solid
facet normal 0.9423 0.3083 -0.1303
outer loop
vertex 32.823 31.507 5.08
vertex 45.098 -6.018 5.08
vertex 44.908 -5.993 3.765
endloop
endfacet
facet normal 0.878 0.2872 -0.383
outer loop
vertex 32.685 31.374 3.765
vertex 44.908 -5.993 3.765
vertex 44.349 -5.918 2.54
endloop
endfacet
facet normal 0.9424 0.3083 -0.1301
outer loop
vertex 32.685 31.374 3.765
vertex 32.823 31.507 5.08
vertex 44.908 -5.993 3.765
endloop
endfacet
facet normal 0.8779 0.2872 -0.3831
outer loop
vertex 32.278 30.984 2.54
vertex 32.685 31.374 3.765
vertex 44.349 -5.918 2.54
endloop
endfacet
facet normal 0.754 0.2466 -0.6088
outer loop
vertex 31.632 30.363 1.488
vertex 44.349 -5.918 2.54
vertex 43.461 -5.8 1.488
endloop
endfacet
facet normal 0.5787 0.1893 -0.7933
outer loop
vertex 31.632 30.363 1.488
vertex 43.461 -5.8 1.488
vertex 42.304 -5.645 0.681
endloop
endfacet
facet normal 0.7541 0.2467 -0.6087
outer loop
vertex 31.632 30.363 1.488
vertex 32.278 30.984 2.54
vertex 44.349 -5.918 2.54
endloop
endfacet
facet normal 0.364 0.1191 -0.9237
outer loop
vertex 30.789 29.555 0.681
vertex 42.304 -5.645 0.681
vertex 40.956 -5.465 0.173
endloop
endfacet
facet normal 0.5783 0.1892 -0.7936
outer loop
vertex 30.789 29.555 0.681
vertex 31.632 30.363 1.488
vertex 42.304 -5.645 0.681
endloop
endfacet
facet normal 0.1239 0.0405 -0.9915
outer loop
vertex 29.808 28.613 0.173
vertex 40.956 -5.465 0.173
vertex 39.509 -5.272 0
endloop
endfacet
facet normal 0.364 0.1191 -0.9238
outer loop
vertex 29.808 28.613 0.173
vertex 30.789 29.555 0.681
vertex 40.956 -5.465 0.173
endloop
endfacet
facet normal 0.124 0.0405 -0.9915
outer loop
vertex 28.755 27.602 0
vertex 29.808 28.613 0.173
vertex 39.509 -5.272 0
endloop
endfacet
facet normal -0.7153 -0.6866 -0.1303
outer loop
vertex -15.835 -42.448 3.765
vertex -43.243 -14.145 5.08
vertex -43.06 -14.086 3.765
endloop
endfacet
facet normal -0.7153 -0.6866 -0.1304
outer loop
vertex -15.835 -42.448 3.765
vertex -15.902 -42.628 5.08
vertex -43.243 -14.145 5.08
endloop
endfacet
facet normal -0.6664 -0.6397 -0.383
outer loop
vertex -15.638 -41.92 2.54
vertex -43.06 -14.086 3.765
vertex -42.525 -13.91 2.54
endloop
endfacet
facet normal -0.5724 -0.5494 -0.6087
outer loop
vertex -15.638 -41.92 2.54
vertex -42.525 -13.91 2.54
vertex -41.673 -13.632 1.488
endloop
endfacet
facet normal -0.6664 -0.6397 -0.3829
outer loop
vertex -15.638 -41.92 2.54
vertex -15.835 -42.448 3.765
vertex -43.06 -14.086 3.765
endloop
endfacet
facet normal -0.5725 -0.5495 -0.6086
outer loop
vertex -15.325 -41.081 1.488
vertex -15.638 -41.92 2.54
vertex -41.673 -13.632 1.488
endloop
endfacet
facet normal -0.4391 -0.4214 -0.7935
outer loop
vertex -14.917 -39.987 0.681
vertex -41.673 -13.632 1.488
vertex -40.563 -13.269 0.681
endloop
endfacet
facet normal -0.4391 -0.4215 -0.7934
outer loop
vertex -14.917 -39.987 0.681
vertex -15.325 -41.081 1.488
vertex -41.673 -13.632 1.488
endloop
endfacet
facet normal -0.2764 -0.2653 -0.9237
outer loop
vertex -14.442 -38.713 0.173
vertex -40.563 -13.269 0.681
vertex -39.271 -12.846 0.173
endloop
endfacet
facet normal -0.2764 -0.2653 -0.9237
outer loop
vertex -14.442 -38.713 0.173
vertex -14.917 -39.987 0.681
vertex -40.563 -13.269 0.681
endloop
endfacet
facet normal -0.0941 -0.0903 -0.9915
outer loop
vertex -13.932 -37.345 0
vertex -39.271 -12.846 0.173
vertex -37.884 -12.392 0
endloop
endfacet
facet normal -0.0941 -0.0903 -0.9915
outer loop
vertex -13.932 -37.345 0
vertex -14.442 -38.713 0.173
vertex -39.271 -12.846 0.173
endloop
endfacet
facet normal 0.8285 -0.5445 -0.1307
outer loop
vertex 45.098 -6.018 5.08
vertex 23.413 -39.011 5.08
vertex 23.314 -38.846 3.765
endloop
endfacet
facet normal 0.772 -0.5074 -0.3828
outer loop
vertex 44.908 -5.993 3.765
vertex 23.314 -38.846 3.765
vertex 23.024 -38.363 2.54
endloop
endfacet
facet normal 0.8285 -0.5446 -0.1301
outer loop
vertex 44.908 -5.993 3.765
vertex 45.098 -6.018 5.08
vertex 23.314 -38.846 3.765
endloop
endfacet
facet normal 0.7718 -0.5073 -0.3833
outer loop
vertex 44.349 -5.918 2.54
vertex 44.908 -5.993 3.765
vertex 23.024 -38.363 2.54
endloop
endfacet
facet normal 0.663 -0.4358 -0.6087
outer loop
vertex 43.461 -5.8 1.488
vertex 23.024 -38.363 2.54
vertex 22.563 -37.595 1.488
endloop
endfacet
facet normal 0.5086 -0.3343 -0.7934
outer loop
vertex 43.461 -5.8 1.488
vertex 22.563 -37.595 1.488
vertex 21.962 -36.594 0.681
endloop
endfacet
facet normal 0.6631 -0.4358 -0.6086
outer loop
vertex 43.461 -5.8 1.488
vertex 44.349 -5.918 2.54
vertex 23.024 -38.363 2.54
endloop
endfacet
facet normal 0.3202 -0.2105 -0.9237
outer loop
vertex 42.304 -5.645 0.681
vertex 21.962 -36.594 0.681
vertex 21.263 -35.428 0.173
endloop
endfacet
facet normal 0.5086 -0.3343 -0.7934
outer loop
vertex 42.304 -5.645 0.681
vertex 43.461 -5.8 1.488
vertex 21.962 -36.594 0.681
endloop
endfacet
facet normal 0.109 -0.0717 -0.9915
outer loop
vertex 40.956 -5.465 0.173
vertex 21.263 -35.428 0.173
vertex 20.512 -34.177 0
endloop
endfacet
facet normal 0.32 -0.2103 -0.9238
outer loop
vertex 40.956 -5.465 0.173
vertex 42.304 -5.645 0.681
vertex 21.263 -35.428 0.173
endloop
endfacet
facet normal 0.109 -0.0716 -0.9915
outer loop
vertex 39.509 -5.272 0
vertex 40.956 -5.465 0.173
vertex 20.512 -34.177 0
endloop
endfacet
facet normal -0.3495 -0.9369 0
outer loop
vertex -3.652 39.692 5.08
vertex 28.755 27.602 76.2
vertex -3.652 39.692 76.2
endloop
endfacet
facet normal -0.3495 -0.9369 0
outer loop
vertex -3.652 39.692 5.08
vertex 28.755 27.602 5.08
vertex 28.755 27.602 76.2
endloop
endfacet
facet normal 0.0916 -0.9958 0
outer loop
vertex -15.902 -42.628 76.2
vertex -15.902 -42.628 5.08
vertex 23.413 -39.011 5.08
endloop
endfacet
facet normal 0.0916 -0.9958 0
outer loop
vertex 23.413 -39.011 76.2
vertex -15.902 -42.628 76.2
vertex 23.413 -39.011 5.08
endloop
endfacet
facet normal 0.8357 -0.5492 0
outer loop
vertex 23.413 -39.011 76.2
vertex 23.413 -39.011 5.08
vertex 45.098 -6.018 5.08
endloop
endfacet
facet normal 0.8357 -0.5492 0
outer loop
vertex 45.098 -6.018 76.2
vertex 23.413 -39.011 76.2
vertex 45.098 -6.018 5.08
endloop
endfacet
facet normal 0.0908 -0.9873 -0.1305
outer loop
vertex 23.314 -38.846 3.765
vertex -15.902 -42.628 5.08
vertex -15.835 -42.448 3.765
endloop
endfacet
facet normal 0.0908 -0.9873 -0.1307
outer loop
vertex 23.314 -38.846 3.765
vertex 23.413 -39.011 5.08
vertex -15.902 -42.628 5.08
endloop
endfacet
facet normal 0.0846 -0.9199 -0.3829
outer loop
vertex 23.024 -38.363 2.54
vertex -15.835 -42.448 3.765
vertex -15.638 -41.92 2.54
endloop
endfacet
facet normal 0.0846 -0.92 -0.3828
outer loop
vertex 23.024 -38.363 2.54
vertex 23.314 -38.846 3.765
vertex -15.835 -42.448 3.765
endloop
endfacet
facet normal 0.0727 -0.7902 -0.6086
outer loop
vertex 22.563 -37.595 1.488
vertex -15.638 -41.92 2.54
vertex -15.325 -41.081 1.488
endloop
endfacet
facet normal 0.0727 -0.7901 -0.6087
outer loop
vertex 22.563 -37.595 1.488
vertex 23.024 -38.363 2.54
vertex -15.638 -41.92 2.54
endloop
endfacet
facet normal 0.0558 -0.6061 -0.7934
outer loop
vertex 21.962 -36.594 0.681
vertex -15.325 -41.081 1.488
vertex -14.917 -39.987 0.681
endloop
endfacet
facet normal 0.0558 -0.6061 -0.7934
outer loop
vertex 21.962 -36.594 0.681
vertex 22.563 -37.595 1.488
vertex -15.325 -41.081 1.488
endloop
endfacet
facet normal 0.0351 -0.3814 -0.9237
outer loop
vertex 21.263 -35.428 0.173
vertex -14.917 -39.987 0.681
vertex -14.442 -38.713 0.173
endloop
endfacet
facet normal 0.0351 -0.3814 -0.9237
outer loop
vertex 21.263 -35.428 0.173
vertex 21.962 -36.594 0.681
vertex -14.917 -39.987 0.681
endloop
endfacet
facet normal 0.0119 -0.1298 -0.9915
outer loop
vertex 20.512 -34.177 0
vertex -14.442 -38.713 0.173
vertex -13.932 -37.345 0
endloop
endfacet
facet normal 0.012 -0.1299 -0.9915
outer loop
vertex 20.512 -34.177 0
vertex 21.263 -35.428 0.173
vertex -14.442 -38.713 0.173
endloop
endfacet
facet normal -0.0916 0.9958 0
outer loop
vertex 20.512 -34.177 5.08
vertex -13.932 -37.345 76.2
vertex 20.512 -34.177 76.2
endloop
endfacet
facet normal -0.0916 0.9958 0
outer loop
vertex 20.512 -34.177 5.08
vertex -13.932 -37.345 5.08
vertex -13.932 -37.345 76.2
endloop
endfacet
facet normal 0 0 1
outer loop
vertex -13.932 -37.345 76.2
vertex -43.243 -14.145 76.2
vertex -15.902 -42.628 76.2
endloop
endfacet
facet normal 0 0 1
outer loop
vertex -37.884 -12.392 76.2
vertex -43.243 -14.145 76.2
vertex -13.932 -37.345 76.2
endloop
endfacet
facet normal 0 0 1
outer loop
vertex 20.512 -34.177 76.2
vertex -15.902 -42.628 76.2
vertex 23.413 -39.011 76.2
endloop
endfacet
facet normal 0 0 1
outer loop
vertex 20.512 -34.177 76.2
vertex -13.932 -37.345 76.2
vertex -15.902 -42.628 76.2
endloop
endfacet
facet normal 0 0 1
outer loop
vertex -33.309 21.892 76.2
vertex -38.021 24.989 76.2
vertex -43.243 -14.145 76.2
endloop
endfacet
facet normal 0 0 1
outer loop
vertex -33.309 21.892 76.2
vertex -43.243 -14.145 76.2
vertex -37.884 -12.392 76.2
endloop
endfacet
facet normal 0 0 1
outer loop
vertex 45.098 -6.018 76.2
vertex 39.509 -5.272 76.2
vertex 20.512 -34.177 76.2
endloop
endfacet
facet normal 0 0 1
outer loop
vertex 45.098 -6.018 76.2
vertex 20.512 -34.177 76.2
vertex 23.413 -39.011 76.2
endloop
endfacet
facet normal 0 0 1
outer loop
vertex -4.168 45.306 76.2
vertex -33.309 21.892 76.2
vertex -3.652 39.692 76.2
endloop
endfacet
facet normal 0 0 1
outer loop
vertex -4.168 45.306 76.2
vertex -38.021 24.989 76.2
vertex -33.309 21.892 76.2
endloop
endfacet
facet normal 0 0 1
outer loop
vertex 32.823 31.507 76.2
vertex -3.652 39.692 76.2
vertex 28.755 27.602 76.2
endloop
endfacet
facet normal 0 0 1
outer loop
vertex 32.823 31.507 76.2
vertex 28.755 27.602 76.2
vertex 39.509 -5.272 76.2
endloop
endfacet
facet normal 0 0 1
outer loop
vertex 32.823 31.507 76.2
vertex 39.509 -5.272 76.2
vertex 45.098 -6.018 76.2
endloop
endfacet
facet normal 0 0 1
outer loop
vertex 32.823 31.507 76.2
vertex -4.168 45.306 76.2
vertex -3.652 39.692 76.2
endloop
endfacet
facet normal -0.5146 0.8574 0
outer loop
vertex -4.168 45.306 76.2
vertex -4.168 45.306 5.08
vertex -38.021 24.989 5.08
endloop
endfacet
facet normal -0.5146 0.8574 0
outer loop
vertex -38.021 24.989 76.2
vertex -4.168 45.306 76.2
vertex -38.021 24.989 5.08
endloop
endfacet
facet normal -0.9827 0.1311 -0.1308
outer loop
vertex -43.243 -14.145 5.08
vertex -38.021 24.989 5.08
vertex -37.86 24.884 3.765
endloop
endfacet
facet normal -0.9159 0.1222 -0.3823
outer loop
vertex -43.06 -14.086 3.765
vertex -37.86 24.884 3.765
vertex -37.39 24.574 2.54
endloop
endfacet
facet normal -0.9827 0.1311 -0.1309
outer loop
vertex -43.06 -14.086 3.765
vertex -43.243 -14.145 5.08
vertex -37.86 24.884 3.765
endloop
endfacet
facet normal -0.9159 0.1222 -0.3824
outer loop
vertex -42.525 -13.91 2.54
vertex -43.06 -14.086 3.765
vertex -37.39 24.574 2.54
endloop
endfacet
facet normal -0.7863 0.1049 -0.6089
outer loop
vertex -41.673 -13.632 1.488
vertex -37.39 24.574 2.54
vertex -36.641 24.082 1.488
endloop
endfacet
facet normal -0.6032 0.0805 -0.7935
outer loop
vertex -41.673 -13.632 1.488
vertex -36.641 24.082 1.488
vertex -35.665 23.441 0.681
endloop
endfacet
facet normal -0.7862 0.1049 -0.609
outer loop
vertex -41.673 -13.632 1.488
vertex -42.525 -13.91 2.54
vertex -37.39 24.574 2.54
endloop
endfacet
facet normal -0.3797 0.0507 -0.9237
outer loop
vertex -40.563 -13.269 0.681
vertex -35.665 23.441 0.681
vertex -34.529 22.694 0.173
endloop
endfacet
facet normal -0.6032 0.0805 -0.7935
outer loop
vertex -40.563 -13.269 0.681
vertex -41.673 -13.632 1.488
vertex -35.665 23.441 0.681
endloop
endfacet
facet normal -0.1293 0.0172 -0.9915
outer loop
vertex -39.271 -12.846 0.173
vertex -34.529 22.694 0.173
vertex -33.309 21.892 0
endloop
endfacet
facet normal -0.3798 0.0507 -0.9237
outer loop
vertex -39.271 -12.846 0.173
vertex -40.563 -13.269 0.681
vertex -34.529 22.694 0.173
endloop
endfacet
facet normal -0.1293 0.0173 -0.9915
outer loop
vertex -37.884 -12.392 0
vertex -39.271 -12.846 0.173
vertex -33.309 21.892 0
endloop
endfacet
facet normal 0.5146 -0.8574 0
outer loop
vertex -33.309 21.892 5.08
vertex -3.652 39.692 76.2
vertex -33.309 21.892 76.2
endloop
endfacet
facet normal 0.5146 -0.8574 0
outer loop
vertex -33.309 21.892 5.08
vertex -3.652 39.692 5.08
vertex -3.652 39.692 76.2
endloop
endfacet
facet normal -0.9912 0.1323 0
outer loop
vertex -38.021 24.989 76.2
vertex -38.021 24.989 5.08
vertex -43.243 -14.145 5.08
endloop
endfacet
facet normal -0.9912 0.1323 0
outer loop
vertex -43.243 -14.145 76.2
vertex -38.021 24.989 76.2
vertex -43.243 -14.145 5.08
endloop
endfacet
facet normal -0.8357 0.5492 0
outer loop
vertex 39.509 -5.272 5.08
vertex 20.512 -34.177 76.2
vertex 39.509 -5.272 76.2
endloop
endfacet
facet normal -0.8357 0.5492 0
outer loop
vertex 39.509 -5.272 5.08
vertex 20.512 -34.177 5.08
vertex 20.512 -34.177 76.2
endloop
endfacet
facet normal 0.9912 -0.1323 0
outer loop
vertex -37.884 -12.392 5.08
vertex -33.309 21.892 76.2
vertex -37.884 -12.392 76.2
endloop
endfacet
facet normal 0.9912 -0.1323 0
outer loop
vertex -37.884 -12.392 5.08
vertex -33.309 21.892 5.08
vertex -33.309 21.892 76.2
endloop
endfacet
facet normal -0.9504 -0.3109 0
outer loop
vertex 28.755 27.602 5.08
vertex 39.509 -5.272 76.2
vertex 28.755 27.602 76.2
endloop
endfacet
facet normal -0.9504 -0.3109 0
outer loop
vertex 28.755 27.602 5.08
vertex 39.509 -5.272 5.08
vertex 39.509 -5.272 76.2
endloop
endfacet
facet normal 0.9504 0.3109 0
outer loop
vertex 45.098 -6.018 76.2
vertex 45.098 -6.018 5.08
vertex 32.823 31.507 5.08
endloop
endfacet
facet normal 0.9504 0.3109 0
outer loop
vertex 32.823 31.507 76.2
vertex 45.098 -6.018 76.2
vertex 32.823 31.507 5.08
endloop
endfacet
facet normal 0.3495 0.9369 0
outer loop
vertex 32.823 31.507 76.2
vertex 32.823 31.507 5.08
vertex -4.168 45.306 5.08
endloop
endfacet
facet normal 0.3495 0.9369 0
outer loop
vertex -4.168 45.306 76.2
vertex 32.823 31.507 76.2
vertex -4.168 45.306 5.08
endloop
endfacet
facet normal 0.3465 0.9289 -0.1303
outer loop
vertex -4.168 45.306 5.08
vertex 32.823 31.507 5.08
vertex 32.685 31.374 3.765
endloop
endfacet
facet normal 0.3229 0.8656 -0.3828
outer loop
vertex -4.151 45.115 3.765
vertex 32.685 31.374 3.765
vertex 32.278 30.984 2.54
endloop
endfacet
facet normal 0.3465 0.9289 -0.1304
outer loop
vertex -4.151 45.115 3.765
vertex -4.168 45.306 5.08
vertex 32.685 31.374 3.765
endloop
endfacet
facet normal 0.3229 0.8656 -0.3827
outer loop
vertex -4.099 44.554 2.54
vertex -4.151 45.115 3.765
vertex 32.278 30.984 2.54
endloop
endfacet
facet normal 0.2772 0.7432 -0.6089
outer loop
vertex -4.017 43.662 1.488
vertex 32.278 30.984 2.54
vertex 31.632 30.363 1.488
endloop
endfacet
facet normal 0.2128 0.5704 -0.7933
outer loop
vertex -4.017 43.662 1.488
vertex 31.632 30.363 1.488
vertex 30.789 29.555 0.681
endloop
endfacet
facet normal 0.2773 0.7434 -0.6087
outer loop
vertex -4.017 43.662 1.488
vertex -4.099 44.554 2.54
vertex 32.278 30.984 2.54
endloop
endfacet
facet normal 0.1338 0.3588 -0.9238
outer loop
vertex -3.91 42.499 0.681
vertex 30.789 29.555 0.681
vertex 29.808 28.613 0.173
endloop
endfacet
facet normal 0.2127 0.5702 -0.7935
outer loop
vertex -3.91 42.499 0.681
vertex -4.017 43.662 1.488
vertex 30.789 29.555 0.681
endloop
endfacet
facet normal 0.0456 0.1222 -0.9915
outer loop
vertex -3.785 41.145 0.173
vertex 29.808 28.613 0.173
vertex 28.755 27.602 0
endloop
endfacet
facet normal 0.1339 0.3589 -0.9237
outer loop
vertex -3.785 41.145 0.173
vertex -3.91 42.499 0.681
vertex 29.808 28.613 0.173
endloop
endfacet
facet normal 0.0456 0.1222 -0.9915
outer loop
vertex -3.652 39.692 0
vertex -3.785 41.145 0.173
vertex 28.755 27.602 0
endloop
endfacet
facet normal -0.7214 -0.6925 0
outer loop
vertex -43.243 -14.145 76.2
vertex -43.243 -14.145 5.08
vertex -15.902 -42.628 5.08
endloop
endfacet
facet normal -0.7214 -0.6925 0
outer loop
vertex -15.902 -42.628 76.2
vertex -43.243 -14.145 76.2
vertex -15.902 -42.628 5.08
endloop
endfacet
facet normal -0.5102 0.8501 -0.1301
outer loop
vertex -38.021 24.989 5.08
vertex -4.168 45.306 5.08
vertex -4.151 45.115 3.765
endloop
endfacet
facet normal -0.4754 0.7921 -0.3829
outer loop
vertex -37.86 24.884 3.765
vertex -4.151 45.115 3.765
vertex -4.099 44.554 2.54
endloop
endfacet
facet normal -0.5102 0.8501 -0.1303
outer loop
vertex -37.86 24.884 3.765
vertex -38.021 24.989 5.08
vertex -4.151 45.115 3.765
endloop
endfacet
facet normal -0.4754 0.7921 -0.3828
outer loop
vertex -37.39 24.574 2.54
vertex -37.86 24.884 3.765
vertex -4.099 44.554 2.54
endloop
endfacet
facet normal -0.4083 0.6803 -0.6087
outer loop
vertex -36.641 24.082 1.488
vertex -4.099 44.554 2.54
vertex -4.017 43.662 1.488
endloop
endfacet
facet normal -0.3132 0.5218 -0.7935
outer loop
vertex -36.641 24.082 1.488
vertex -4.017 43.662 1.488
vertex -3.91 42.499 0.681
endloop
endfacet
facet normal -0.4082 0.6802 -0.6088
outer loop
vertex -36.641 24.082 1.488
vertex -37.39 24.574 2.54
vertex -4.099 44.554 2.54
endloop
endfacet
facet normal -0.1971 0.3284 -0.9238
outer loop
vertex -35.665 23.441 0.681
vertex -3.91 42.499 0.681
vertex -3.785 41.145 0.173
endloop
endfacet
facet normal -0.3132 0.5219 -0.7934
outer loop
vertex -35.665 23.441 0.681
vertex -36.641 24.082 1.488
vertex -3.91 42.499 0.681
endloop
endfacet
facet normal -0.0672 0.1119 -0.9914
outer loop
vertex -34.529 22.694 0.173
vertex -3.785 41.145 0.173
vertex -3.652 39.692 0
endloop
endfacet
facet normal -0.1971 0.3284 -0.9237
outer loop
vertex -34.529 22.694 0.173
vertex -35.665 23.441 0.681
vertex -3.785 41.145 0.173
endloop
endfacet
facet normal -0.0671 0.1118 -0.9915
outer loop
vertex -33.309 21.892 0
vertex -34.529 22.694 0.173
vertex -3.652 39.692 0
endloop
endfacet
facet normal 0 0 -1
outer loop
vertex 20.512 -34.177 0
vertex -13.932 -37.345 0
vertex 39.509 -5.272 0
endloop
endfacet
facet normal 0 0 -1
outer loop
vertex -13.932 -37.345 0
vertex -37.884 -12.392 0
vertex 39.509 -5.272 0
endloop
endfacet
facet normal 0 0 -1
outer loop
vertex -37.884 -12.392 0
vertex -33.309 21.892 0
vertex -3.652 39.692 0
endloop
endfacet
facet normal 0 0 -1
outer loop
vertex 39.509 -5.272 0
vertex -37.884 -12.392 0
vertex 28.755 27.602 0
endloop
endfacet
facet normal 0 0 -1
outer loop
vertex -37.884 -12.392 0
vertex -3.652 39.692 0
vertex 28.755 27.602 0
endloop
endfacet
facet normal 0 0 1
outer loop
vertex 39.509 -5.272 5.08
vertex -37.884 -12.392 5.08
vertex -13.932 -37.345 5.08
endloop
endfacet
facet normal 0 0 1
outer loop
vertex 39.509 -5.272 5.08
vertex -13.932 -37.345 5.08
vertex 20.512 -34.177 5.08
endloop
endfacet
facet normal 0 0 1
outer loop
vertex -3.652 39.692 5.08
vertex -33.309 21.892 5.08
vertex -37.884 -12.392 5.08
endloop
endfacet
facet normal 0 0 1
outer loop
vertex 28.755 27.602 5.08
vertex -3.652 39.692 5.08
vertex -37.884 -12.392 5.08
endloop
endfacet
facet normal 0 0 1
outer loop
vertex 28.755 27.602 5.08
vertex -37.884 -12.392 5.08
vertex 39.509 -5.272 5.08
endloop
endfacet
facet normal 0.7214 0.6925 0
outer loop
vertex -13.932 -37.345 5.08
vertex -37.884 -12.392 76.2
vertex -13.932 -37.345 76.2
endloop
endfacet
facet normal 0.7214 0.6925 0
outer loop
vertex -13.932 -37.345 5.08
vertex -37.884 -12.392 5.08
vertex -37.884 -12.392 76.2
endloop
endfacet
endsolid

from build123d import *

# Parameters (mm, degrees)
F1_DEPTH = 76.2
F2_T     = -5.08
F3_R     = 5.08


with BuildPart() as f1:
    # F0 (on Top) → F1 (new body)
    with BuildSketch(Plane.XY):
        Polygon((-43.242968, -14.145307), (-15.902303, -42.628169), (23.413121, -39.01115), (45.097987, -6.017939), (32.823149, 31.506902), (-4.168189, 45.306404), (-38.020797, 24.989259), align=None)
    extrude(amount=F1_DEPTH)

    # F2
    f2_openings = [f1.faces().sort_by_distance(p)[0] for p in [
        (0, 0, 76.2),
    ]]
    offset(amount=F2_T, openings=f2_openings)

    # F3
    f3_edges = [f1.edges().sort_by_distance(p)[0] for p in [
        (3.755409, -40.819659, 0),
        (34.255554, -22.514545, 0),
        (38.960568, 12.744482, 0),
        (14.32748, 38.406653, 0),
        (-21.094493, 35.147832, 0),
        (-40.631882, 5.421976, 0),
        (-29.572636, -28.386738, 0),
    ]]
    fillet(f3_edges, radius=F3_R)


solid = f1.part
